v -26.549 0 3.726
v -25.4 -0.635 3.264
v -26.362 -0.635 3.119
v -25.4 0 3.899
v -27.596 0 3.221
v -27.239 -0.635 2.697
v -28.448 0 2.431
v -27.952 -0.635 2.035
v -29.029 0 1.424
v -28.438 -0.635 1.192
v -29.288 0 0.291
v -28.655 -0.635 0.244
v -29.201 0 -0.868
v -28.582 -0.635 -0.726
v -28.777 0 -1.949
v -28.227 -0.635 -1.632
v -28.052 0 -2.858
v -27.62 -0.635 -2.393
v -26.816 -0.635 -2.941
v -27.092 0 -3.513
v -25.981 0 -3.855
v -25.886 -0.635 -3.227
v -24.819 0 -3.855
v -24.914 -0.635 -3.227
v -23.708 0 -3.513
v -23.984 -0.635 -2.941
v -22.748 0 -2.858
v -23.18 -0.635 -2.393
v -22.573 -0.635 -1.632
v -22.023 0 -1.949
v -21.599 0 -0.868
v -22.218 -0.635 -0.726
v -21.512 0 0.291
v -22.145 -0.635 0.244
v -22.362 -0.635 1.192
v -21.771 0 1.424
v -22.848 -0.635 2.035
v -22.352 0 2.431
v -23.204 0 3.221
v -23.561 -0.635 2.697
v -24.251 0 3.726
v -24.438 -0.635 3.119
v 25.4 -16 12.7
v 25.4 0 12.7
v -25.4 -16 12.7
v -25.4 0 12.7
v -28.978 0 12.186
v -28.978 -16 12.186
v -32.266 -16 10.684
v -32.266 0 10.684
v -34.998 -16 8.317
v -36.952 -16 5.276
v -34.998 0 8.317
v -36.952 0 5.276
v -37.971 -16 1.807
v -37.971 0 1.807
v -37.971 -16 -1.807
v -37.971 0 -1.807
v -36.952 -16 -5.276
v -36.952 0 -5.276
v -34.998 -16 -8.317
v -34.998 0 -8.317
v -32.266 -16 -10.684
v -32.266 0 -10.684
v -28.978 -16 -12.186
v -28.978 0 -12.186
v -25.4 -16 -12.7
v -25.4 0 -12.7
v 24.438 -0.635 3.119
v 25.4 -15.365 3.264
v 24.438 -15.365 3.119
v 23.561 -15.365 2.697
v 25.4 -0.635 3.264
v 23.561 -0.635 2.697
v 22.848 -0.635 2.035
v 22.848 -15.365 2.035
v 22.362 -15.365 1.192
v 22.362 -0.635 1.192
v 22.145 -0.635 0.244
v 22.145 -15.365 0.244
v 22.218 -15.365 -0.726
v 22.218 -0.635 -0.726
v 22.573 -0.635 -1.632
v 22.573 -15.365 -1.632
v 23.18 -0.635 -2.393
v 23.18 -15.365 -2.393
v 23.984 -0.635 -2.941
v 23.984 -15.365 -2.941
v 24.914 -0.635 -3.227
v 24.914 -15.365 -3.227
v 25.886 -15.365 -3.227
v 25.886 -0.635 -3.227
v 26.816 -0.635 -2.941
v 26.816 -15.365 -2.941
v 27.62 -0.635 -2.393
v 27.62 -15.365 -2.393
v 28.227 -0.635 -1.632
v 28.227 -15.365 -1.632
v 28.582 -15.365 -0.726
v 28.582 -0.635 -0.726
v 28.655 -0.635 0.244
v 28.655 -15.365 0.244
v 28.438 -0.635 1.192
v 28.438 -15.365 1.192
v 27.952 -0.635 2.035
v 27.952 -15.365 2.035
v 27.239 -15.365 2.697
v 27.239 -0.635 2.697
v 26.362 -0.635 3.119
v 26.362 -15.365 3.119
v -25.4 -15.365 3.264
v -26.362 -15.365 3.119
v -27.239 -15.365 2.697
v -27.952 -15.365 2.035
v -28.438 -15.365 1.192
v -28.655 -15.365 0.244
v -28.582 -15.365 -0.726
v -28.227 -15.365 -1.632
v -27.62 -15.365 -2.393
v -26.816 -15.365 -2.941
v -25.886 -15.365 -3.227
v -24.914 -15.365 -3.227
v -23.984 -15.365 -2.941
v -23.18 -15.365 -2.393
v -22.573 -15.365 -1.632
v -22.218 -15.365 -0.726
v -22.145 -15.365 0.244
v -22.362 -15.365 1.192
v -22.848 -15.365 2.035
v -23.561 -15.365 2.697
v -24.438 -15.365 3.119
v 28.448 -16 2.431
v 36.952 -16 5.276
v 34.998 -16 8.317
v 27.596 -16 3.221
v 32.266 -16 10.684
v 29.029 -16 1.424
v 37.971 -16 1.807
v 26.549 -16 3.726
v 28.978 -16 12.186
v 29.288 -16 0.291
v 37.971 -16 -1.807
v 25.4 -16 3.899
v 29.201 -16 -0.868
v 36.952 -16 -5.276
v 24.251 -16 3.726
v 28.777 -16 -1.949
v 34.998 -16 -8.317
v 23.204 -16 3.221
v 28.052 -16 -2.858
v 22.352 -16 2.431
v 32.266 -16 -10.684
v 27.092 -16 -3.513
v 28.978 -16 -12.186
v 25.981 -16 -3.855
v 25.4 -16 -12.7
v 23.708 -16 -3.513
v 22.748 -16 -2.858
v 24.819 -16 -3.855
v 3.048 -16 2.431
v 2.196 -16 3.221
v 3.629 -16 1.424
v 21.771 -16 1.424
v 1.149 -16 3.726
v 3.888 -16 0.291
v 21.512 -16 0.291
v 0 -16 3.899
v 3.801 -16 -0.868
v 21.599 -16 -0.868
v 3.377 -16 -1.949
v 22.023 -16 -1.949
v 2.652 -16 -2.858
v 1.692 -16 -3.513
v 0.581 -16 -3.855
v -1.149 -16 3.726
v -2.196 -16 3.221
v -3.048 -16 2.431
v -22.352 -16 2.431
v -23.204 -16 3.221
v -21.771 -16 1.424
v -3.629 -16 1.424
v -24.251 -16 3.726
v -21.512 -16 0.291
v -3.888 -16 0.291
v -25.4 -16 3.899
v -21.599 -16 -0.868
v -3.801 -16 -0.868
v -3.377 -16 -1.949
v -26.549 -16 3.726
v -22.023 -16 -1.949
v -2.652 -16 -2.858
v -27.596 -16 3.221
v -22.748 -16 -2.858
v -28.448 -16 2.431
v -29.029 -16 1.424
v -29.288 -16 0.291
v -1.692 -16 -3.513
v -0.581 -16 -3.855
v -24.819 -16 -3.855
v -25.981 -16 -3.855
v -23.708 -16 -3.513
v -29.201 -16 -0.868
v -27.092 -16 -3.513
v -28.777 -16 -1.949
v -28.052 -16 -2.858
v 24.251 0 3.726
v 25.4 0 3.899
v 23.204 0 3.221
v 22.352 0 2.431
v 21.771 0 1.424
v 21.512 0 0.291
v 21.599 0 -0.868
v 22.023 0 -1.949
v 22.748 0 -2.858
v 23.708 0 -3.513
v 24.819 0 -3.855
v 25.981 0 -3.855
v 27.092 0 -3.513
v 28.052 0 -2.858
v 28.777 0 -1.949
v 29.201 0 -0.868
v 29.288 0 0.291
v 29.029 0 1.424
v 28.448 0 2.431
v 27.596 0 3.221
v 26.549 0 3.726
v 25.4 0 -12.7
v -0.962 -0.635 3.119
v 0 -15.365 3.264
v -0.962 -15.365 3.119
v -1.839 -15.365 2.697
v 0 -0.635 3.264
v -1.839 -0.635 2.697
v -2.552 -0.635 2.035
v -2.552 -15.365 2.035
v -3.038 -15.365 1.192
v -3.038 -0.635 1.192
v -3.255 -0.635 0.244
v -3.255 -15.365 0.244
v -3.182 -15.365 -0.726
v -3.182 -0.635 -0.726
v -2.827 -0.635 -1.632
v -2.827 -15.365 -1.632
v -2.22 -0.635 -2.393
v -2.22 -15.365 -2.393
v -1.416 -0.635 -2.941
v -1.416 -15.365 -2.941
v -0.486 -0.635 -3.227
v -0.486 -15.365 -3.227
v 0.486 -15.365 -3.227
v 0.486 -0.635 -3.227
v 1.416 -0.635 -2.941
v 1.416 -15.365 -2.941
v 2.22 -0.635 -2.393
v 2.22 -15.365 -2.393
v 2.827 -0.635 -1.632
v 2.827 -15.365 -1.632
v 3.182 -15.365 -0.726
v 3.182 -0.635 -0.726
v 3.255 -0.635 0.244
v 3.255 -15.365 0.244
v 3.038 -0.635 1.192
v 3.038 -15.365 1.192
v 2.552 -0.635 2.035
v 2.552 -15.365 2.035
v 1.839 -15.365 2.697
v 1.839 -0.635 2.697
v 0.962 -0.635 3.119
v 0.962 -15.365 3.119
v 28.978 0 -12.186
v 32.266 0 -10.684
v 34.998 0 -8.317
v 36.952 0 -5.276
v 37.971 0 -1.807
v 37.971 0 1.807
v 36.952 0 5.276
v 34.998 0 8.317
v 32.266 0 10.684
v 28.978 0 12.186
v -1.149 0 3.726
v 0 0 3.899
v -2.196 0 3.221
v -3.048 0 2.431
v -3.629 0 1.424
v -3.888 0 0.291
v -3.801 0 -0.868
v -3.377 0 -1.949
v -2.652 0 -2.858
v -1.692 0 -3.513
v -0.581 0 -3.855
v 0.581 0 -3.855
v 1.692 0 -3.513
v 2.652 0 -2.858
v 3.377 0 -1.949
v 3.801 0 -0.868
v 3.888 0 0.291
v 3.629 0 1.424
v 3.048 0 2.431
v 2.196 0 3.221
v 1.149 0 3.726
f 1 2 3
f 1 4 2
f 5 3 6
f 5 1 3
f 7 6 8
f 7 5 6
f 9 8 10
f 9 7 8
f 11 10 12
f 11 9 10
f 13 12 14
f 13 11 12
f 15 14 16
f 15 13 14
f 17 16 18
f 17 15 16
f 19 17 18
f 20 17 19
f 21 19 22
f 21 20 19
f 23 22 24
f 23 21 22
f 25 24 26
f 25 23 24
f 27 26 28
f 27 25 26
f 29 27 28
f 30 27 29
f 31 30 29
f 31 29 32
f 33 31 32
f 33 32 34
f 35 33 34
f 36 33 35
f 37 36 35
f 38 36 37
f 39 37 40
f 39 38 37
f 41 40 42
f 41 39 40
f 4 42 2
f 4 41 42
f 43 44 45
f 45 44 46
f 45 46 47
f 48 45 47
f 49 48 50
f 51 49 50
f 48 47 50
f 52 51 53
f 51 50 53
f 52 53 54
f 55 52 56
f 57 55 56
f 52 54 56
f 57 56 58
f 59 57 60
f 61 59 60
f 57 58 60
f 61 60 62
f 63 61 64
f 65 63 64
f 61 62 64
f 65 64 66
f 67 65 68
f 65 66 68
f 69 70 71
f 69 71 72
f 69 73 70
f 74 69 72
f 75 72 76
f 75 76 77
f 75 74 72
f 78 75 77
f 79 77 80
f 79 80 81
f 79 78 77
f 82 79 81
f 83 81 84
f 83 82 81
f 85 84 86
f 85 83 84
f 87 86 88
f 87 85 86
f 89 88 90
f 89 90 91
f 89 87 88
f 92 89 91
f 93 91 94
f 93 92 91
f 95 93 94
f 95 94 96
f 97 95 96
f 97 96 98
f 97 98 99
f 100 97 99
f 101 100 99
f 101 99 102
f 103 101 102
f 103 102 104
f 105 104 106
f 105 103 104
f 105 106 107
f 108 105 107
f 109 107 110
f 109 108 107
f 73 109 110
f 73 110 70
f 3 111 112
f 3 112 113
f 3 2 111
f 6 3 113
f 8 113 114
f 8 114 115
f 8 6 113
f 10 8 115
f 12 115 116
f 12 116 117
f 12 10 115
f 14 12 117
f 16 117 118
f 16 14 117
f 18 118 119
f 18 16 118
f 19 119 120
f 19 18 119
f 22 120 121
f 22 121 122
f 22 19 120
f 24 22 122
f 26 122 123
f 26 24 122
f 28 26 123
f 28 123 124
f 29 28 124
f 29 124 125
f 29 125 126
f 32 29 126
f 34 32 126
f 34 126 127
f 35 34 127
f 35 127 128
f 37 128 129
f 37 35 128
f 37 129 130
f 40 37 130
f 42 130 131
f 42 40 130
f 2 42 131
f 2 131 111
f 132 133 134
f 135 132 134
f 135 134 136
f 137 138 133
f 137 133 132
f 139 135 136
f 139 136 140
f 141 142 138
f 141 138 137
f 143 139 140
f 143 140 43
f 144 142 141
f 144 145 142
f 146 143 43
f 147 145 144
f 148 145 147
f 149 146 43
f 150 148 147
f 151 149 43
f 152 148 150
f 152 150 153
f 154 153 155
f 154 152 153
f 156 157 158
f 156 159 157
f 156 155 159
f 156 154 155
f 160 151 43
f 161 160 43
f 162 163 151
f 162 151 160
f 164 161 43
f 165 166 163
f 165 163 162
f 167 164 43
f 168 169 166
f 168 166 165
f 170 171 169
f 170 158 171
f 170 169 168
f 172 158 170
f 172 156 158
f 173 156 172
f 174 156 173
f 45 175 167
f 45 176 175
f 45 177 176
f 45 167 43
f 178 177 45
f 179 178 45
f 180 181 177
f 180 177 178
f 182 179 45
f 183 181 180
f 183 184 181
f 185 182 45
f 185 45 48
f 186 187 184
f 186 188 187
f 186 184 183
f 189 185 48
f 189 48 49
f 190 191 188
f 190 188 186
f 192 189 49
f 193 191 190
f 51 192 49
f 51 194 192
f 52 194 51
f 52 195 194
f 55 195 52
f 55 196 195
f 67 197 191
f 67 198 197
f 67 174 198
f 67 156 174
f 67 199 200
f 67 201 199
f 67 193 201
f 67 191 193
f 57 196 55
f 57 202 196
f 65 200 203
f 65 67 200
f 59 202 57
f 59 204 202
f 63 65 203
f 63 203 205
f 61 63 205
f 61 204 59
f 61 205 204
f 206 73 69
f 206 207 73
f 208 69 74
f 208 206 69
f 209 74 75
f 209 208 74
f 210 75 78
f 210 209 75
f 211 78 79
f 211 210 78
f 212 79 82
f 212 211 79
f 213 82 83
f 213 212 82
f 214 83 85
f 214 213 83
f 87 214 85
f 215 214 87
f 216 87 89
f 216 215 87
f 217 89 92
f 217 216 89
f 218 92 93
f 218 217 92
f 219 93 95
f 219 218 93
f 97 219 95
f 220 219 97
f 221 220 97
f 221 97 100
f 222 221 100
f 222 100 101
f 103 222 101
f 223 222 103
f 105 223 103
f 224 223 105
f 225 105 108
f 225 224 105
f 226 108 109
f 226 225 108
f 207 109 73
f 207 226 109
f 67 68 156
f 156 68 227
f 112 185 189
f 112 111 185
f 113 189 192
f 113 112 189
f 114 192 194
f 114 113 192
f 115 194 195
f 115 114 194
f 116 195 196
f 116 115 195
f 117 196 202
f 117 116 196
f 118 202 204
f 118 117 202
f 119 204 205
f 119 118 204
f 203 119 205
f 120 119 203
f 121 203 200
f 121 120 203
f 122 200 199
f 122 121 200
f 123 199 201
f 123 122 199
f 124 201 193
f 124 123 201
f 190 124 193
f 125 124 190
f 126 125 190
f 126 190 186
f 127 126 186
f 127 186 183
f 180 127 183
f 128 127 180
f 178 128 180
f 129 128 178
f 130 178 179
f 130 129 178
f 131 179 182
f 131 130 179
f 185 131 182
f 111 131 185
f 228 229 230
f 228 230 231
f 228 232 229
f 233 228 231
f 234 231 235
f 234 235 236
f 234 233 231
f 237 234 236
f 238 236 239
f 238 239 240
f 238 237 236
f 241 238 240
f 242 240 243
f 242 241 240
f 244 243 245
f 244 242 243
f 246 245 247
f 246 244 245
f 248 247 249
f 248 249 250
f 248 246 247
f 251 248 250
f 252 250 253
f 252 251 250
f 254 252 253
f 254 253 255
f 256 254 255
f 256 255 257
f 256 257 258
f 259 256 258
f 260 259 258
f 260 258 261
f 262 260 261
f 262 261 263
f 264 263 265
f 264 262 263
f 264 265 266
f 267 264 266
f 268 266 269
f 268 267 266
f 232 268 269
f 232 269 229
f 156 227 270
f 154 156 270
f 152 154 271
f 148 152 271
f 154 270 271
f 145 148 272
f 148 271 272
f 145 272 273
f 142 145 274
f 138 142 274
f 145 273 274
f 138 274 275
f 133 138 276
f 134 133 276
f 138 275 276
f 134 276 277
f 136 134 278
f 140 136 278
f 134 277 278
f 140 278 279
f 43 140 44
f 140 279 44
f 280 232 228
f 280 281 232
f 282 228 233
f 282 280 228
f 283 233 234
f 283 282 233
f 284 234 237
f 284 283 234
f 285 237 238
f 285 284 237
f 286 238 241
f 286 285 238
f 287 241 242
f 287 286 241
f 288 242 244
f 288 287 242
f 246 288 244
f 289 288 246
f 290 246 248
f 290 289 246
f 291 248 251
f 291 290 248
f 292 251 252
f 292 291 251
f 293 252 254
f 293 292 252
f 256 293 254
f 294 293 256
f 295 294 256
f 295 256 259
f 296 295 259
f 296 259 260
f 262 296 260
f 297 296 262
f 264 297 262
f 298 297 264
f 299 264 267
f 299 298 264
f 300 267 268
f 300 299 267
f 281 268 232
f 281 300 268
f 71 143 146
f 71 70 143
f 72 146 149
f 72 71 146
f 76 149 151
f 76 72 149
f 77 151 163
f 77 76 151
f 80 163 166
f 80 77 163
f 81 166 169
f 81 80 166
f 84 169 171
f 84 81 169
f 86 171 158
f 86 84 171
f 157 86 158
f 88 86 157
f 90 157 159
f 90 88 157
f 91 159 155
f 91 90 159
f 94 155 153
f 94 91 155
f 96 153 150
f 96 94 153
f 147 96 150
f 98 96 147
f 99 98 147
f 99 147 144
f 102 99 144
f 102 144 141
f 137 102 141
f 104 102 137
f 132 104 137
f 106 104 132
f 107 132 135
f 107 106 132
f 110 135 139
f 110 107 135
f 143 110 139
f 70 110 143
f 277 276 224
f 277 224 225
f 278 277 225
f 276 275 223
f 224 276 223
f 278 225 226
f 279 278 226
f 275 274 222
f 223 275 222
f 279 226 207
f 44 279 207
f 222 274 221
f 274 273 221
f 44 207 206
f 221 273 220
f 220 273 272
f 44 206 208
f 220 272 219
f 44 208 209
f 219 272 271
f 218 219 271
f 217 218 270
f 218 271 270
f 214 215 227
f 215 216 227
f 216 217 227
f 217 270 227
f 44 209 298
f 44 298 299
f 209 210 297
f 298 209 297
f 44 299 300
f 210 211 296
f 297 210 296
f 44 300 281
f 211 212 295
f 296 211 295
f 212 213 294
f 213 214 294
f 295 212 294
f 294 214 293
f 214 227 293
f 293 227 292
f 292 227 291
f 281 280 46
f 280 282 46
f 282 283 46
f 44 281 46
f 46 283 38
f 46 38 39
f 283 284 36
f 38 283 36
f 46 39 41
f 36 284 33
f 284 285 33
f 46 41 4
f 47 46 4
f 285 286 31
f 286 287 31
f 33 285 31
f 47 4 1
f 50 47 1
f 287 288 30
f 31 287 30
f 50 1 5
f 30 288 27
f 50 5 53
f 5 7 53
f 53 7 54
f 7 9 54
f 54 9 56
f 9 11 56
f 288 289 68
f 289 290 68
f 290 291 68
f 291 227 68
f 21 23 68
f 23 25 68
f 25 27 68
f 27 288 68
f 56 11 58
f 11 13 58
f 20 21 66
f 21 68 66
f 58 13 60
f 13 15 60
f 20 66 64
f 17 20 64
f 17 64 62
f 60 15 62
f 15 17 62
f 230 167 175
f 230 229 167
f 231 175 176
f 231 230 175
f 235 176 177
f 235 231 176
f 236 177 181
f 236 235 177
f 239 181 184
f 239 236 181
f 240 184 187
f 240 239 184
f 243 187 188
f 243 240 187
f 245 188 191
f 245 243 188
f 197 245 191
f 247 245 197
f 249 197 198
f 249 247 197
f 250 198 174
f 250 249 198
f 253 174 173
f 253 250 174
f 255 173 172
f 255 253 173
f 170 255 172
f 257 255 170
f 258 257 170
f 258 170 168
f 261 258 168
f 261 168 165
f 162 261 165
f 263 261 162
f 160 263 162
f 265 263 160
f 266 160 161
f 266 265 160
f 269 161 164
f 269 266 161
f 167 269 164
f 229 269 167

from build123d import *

# Parameters (mm, degrees)
EXTRUDE1_DEPTH                   = 16
F_1_4_CLEARANCE_HOLE1_AT_2_COUNT = 2
F_1_4_CLEARANCE_HOLE1_AT_2_PITCH = 25.4
F_1_4_CLEARANCE_HOLE1_AT_3_COUNT = 2
F_1_4_CLEARANCE_HOLE1_AT_3_PITCH = 25.4


with BuildPart() as part:
    # Sketch1 → Extrude1 (new body)
    with BuildSketch(Plane(origin=(0, 0, 0), x_dir=(1, 0, 0), z_dir=(0, 1, 0))):
        with BuildLine():
            Line((-25.4, 12.7), (25.4, 12.7))
            ThreePointArc((25.4, 12.7), (38.1, 0), (25.4, -12.7))
            Line((25.4, -12.7), (-25.4, -12.7))
            ThreePointArc((-25.4, -12.7), (-38.1, 0), (-25.4, 12.7))
        make_face()
    extrude(amount=-EXTRUDE1_DEPTH)

    # Sketch2 → 1/4 Clearance Hole1 (revolve, cut)
    with BuildSketch(Plane(origin=(0, 0, 0), x_dir=(0, 0, 1), z_dir=(1, 0, 0))):
        Polygon((0, 0), (0, 16), (3.8989, 16), (3.2639, 15.365), (3.2639, 0.635), (3.8989, 0), align=None)
    f_1_4_clearance_hole1 = revolve(axis=Axis((0, 6.35, 0), (0, -1, 0)), mode=Mode.SUBTRACT)

    # 1/4 Clearance Hole1 at 2: 1/4 Clearance Hole1 ×2
    with Locations(*[(-i * F_1_4_CLEARANCE_HOLE1_AT_2_PITCH, 0, 0) for i in range(1, F_1_4_CLEARANCE_HOLE1_AT_2_COUNT)]):
        add(f_1_4_clearance_hole1, mode=Mode.SUBTRACT)

    # 1/4 Clearance Hole1 at 3: 1/4 Clearance Hole1 ×2
    with Locations(*[(i * F_1_4_CLEARANCE_HOLE1_AT_3_PITCH, 0, 0) for i in range(1, F_1_4_CLEARANCE_HOLE1_AT_3_COUNT)]):
        add(f_1_4_clearance_hole1, mode=Mode.SUBTRACT)


solid = part.part
